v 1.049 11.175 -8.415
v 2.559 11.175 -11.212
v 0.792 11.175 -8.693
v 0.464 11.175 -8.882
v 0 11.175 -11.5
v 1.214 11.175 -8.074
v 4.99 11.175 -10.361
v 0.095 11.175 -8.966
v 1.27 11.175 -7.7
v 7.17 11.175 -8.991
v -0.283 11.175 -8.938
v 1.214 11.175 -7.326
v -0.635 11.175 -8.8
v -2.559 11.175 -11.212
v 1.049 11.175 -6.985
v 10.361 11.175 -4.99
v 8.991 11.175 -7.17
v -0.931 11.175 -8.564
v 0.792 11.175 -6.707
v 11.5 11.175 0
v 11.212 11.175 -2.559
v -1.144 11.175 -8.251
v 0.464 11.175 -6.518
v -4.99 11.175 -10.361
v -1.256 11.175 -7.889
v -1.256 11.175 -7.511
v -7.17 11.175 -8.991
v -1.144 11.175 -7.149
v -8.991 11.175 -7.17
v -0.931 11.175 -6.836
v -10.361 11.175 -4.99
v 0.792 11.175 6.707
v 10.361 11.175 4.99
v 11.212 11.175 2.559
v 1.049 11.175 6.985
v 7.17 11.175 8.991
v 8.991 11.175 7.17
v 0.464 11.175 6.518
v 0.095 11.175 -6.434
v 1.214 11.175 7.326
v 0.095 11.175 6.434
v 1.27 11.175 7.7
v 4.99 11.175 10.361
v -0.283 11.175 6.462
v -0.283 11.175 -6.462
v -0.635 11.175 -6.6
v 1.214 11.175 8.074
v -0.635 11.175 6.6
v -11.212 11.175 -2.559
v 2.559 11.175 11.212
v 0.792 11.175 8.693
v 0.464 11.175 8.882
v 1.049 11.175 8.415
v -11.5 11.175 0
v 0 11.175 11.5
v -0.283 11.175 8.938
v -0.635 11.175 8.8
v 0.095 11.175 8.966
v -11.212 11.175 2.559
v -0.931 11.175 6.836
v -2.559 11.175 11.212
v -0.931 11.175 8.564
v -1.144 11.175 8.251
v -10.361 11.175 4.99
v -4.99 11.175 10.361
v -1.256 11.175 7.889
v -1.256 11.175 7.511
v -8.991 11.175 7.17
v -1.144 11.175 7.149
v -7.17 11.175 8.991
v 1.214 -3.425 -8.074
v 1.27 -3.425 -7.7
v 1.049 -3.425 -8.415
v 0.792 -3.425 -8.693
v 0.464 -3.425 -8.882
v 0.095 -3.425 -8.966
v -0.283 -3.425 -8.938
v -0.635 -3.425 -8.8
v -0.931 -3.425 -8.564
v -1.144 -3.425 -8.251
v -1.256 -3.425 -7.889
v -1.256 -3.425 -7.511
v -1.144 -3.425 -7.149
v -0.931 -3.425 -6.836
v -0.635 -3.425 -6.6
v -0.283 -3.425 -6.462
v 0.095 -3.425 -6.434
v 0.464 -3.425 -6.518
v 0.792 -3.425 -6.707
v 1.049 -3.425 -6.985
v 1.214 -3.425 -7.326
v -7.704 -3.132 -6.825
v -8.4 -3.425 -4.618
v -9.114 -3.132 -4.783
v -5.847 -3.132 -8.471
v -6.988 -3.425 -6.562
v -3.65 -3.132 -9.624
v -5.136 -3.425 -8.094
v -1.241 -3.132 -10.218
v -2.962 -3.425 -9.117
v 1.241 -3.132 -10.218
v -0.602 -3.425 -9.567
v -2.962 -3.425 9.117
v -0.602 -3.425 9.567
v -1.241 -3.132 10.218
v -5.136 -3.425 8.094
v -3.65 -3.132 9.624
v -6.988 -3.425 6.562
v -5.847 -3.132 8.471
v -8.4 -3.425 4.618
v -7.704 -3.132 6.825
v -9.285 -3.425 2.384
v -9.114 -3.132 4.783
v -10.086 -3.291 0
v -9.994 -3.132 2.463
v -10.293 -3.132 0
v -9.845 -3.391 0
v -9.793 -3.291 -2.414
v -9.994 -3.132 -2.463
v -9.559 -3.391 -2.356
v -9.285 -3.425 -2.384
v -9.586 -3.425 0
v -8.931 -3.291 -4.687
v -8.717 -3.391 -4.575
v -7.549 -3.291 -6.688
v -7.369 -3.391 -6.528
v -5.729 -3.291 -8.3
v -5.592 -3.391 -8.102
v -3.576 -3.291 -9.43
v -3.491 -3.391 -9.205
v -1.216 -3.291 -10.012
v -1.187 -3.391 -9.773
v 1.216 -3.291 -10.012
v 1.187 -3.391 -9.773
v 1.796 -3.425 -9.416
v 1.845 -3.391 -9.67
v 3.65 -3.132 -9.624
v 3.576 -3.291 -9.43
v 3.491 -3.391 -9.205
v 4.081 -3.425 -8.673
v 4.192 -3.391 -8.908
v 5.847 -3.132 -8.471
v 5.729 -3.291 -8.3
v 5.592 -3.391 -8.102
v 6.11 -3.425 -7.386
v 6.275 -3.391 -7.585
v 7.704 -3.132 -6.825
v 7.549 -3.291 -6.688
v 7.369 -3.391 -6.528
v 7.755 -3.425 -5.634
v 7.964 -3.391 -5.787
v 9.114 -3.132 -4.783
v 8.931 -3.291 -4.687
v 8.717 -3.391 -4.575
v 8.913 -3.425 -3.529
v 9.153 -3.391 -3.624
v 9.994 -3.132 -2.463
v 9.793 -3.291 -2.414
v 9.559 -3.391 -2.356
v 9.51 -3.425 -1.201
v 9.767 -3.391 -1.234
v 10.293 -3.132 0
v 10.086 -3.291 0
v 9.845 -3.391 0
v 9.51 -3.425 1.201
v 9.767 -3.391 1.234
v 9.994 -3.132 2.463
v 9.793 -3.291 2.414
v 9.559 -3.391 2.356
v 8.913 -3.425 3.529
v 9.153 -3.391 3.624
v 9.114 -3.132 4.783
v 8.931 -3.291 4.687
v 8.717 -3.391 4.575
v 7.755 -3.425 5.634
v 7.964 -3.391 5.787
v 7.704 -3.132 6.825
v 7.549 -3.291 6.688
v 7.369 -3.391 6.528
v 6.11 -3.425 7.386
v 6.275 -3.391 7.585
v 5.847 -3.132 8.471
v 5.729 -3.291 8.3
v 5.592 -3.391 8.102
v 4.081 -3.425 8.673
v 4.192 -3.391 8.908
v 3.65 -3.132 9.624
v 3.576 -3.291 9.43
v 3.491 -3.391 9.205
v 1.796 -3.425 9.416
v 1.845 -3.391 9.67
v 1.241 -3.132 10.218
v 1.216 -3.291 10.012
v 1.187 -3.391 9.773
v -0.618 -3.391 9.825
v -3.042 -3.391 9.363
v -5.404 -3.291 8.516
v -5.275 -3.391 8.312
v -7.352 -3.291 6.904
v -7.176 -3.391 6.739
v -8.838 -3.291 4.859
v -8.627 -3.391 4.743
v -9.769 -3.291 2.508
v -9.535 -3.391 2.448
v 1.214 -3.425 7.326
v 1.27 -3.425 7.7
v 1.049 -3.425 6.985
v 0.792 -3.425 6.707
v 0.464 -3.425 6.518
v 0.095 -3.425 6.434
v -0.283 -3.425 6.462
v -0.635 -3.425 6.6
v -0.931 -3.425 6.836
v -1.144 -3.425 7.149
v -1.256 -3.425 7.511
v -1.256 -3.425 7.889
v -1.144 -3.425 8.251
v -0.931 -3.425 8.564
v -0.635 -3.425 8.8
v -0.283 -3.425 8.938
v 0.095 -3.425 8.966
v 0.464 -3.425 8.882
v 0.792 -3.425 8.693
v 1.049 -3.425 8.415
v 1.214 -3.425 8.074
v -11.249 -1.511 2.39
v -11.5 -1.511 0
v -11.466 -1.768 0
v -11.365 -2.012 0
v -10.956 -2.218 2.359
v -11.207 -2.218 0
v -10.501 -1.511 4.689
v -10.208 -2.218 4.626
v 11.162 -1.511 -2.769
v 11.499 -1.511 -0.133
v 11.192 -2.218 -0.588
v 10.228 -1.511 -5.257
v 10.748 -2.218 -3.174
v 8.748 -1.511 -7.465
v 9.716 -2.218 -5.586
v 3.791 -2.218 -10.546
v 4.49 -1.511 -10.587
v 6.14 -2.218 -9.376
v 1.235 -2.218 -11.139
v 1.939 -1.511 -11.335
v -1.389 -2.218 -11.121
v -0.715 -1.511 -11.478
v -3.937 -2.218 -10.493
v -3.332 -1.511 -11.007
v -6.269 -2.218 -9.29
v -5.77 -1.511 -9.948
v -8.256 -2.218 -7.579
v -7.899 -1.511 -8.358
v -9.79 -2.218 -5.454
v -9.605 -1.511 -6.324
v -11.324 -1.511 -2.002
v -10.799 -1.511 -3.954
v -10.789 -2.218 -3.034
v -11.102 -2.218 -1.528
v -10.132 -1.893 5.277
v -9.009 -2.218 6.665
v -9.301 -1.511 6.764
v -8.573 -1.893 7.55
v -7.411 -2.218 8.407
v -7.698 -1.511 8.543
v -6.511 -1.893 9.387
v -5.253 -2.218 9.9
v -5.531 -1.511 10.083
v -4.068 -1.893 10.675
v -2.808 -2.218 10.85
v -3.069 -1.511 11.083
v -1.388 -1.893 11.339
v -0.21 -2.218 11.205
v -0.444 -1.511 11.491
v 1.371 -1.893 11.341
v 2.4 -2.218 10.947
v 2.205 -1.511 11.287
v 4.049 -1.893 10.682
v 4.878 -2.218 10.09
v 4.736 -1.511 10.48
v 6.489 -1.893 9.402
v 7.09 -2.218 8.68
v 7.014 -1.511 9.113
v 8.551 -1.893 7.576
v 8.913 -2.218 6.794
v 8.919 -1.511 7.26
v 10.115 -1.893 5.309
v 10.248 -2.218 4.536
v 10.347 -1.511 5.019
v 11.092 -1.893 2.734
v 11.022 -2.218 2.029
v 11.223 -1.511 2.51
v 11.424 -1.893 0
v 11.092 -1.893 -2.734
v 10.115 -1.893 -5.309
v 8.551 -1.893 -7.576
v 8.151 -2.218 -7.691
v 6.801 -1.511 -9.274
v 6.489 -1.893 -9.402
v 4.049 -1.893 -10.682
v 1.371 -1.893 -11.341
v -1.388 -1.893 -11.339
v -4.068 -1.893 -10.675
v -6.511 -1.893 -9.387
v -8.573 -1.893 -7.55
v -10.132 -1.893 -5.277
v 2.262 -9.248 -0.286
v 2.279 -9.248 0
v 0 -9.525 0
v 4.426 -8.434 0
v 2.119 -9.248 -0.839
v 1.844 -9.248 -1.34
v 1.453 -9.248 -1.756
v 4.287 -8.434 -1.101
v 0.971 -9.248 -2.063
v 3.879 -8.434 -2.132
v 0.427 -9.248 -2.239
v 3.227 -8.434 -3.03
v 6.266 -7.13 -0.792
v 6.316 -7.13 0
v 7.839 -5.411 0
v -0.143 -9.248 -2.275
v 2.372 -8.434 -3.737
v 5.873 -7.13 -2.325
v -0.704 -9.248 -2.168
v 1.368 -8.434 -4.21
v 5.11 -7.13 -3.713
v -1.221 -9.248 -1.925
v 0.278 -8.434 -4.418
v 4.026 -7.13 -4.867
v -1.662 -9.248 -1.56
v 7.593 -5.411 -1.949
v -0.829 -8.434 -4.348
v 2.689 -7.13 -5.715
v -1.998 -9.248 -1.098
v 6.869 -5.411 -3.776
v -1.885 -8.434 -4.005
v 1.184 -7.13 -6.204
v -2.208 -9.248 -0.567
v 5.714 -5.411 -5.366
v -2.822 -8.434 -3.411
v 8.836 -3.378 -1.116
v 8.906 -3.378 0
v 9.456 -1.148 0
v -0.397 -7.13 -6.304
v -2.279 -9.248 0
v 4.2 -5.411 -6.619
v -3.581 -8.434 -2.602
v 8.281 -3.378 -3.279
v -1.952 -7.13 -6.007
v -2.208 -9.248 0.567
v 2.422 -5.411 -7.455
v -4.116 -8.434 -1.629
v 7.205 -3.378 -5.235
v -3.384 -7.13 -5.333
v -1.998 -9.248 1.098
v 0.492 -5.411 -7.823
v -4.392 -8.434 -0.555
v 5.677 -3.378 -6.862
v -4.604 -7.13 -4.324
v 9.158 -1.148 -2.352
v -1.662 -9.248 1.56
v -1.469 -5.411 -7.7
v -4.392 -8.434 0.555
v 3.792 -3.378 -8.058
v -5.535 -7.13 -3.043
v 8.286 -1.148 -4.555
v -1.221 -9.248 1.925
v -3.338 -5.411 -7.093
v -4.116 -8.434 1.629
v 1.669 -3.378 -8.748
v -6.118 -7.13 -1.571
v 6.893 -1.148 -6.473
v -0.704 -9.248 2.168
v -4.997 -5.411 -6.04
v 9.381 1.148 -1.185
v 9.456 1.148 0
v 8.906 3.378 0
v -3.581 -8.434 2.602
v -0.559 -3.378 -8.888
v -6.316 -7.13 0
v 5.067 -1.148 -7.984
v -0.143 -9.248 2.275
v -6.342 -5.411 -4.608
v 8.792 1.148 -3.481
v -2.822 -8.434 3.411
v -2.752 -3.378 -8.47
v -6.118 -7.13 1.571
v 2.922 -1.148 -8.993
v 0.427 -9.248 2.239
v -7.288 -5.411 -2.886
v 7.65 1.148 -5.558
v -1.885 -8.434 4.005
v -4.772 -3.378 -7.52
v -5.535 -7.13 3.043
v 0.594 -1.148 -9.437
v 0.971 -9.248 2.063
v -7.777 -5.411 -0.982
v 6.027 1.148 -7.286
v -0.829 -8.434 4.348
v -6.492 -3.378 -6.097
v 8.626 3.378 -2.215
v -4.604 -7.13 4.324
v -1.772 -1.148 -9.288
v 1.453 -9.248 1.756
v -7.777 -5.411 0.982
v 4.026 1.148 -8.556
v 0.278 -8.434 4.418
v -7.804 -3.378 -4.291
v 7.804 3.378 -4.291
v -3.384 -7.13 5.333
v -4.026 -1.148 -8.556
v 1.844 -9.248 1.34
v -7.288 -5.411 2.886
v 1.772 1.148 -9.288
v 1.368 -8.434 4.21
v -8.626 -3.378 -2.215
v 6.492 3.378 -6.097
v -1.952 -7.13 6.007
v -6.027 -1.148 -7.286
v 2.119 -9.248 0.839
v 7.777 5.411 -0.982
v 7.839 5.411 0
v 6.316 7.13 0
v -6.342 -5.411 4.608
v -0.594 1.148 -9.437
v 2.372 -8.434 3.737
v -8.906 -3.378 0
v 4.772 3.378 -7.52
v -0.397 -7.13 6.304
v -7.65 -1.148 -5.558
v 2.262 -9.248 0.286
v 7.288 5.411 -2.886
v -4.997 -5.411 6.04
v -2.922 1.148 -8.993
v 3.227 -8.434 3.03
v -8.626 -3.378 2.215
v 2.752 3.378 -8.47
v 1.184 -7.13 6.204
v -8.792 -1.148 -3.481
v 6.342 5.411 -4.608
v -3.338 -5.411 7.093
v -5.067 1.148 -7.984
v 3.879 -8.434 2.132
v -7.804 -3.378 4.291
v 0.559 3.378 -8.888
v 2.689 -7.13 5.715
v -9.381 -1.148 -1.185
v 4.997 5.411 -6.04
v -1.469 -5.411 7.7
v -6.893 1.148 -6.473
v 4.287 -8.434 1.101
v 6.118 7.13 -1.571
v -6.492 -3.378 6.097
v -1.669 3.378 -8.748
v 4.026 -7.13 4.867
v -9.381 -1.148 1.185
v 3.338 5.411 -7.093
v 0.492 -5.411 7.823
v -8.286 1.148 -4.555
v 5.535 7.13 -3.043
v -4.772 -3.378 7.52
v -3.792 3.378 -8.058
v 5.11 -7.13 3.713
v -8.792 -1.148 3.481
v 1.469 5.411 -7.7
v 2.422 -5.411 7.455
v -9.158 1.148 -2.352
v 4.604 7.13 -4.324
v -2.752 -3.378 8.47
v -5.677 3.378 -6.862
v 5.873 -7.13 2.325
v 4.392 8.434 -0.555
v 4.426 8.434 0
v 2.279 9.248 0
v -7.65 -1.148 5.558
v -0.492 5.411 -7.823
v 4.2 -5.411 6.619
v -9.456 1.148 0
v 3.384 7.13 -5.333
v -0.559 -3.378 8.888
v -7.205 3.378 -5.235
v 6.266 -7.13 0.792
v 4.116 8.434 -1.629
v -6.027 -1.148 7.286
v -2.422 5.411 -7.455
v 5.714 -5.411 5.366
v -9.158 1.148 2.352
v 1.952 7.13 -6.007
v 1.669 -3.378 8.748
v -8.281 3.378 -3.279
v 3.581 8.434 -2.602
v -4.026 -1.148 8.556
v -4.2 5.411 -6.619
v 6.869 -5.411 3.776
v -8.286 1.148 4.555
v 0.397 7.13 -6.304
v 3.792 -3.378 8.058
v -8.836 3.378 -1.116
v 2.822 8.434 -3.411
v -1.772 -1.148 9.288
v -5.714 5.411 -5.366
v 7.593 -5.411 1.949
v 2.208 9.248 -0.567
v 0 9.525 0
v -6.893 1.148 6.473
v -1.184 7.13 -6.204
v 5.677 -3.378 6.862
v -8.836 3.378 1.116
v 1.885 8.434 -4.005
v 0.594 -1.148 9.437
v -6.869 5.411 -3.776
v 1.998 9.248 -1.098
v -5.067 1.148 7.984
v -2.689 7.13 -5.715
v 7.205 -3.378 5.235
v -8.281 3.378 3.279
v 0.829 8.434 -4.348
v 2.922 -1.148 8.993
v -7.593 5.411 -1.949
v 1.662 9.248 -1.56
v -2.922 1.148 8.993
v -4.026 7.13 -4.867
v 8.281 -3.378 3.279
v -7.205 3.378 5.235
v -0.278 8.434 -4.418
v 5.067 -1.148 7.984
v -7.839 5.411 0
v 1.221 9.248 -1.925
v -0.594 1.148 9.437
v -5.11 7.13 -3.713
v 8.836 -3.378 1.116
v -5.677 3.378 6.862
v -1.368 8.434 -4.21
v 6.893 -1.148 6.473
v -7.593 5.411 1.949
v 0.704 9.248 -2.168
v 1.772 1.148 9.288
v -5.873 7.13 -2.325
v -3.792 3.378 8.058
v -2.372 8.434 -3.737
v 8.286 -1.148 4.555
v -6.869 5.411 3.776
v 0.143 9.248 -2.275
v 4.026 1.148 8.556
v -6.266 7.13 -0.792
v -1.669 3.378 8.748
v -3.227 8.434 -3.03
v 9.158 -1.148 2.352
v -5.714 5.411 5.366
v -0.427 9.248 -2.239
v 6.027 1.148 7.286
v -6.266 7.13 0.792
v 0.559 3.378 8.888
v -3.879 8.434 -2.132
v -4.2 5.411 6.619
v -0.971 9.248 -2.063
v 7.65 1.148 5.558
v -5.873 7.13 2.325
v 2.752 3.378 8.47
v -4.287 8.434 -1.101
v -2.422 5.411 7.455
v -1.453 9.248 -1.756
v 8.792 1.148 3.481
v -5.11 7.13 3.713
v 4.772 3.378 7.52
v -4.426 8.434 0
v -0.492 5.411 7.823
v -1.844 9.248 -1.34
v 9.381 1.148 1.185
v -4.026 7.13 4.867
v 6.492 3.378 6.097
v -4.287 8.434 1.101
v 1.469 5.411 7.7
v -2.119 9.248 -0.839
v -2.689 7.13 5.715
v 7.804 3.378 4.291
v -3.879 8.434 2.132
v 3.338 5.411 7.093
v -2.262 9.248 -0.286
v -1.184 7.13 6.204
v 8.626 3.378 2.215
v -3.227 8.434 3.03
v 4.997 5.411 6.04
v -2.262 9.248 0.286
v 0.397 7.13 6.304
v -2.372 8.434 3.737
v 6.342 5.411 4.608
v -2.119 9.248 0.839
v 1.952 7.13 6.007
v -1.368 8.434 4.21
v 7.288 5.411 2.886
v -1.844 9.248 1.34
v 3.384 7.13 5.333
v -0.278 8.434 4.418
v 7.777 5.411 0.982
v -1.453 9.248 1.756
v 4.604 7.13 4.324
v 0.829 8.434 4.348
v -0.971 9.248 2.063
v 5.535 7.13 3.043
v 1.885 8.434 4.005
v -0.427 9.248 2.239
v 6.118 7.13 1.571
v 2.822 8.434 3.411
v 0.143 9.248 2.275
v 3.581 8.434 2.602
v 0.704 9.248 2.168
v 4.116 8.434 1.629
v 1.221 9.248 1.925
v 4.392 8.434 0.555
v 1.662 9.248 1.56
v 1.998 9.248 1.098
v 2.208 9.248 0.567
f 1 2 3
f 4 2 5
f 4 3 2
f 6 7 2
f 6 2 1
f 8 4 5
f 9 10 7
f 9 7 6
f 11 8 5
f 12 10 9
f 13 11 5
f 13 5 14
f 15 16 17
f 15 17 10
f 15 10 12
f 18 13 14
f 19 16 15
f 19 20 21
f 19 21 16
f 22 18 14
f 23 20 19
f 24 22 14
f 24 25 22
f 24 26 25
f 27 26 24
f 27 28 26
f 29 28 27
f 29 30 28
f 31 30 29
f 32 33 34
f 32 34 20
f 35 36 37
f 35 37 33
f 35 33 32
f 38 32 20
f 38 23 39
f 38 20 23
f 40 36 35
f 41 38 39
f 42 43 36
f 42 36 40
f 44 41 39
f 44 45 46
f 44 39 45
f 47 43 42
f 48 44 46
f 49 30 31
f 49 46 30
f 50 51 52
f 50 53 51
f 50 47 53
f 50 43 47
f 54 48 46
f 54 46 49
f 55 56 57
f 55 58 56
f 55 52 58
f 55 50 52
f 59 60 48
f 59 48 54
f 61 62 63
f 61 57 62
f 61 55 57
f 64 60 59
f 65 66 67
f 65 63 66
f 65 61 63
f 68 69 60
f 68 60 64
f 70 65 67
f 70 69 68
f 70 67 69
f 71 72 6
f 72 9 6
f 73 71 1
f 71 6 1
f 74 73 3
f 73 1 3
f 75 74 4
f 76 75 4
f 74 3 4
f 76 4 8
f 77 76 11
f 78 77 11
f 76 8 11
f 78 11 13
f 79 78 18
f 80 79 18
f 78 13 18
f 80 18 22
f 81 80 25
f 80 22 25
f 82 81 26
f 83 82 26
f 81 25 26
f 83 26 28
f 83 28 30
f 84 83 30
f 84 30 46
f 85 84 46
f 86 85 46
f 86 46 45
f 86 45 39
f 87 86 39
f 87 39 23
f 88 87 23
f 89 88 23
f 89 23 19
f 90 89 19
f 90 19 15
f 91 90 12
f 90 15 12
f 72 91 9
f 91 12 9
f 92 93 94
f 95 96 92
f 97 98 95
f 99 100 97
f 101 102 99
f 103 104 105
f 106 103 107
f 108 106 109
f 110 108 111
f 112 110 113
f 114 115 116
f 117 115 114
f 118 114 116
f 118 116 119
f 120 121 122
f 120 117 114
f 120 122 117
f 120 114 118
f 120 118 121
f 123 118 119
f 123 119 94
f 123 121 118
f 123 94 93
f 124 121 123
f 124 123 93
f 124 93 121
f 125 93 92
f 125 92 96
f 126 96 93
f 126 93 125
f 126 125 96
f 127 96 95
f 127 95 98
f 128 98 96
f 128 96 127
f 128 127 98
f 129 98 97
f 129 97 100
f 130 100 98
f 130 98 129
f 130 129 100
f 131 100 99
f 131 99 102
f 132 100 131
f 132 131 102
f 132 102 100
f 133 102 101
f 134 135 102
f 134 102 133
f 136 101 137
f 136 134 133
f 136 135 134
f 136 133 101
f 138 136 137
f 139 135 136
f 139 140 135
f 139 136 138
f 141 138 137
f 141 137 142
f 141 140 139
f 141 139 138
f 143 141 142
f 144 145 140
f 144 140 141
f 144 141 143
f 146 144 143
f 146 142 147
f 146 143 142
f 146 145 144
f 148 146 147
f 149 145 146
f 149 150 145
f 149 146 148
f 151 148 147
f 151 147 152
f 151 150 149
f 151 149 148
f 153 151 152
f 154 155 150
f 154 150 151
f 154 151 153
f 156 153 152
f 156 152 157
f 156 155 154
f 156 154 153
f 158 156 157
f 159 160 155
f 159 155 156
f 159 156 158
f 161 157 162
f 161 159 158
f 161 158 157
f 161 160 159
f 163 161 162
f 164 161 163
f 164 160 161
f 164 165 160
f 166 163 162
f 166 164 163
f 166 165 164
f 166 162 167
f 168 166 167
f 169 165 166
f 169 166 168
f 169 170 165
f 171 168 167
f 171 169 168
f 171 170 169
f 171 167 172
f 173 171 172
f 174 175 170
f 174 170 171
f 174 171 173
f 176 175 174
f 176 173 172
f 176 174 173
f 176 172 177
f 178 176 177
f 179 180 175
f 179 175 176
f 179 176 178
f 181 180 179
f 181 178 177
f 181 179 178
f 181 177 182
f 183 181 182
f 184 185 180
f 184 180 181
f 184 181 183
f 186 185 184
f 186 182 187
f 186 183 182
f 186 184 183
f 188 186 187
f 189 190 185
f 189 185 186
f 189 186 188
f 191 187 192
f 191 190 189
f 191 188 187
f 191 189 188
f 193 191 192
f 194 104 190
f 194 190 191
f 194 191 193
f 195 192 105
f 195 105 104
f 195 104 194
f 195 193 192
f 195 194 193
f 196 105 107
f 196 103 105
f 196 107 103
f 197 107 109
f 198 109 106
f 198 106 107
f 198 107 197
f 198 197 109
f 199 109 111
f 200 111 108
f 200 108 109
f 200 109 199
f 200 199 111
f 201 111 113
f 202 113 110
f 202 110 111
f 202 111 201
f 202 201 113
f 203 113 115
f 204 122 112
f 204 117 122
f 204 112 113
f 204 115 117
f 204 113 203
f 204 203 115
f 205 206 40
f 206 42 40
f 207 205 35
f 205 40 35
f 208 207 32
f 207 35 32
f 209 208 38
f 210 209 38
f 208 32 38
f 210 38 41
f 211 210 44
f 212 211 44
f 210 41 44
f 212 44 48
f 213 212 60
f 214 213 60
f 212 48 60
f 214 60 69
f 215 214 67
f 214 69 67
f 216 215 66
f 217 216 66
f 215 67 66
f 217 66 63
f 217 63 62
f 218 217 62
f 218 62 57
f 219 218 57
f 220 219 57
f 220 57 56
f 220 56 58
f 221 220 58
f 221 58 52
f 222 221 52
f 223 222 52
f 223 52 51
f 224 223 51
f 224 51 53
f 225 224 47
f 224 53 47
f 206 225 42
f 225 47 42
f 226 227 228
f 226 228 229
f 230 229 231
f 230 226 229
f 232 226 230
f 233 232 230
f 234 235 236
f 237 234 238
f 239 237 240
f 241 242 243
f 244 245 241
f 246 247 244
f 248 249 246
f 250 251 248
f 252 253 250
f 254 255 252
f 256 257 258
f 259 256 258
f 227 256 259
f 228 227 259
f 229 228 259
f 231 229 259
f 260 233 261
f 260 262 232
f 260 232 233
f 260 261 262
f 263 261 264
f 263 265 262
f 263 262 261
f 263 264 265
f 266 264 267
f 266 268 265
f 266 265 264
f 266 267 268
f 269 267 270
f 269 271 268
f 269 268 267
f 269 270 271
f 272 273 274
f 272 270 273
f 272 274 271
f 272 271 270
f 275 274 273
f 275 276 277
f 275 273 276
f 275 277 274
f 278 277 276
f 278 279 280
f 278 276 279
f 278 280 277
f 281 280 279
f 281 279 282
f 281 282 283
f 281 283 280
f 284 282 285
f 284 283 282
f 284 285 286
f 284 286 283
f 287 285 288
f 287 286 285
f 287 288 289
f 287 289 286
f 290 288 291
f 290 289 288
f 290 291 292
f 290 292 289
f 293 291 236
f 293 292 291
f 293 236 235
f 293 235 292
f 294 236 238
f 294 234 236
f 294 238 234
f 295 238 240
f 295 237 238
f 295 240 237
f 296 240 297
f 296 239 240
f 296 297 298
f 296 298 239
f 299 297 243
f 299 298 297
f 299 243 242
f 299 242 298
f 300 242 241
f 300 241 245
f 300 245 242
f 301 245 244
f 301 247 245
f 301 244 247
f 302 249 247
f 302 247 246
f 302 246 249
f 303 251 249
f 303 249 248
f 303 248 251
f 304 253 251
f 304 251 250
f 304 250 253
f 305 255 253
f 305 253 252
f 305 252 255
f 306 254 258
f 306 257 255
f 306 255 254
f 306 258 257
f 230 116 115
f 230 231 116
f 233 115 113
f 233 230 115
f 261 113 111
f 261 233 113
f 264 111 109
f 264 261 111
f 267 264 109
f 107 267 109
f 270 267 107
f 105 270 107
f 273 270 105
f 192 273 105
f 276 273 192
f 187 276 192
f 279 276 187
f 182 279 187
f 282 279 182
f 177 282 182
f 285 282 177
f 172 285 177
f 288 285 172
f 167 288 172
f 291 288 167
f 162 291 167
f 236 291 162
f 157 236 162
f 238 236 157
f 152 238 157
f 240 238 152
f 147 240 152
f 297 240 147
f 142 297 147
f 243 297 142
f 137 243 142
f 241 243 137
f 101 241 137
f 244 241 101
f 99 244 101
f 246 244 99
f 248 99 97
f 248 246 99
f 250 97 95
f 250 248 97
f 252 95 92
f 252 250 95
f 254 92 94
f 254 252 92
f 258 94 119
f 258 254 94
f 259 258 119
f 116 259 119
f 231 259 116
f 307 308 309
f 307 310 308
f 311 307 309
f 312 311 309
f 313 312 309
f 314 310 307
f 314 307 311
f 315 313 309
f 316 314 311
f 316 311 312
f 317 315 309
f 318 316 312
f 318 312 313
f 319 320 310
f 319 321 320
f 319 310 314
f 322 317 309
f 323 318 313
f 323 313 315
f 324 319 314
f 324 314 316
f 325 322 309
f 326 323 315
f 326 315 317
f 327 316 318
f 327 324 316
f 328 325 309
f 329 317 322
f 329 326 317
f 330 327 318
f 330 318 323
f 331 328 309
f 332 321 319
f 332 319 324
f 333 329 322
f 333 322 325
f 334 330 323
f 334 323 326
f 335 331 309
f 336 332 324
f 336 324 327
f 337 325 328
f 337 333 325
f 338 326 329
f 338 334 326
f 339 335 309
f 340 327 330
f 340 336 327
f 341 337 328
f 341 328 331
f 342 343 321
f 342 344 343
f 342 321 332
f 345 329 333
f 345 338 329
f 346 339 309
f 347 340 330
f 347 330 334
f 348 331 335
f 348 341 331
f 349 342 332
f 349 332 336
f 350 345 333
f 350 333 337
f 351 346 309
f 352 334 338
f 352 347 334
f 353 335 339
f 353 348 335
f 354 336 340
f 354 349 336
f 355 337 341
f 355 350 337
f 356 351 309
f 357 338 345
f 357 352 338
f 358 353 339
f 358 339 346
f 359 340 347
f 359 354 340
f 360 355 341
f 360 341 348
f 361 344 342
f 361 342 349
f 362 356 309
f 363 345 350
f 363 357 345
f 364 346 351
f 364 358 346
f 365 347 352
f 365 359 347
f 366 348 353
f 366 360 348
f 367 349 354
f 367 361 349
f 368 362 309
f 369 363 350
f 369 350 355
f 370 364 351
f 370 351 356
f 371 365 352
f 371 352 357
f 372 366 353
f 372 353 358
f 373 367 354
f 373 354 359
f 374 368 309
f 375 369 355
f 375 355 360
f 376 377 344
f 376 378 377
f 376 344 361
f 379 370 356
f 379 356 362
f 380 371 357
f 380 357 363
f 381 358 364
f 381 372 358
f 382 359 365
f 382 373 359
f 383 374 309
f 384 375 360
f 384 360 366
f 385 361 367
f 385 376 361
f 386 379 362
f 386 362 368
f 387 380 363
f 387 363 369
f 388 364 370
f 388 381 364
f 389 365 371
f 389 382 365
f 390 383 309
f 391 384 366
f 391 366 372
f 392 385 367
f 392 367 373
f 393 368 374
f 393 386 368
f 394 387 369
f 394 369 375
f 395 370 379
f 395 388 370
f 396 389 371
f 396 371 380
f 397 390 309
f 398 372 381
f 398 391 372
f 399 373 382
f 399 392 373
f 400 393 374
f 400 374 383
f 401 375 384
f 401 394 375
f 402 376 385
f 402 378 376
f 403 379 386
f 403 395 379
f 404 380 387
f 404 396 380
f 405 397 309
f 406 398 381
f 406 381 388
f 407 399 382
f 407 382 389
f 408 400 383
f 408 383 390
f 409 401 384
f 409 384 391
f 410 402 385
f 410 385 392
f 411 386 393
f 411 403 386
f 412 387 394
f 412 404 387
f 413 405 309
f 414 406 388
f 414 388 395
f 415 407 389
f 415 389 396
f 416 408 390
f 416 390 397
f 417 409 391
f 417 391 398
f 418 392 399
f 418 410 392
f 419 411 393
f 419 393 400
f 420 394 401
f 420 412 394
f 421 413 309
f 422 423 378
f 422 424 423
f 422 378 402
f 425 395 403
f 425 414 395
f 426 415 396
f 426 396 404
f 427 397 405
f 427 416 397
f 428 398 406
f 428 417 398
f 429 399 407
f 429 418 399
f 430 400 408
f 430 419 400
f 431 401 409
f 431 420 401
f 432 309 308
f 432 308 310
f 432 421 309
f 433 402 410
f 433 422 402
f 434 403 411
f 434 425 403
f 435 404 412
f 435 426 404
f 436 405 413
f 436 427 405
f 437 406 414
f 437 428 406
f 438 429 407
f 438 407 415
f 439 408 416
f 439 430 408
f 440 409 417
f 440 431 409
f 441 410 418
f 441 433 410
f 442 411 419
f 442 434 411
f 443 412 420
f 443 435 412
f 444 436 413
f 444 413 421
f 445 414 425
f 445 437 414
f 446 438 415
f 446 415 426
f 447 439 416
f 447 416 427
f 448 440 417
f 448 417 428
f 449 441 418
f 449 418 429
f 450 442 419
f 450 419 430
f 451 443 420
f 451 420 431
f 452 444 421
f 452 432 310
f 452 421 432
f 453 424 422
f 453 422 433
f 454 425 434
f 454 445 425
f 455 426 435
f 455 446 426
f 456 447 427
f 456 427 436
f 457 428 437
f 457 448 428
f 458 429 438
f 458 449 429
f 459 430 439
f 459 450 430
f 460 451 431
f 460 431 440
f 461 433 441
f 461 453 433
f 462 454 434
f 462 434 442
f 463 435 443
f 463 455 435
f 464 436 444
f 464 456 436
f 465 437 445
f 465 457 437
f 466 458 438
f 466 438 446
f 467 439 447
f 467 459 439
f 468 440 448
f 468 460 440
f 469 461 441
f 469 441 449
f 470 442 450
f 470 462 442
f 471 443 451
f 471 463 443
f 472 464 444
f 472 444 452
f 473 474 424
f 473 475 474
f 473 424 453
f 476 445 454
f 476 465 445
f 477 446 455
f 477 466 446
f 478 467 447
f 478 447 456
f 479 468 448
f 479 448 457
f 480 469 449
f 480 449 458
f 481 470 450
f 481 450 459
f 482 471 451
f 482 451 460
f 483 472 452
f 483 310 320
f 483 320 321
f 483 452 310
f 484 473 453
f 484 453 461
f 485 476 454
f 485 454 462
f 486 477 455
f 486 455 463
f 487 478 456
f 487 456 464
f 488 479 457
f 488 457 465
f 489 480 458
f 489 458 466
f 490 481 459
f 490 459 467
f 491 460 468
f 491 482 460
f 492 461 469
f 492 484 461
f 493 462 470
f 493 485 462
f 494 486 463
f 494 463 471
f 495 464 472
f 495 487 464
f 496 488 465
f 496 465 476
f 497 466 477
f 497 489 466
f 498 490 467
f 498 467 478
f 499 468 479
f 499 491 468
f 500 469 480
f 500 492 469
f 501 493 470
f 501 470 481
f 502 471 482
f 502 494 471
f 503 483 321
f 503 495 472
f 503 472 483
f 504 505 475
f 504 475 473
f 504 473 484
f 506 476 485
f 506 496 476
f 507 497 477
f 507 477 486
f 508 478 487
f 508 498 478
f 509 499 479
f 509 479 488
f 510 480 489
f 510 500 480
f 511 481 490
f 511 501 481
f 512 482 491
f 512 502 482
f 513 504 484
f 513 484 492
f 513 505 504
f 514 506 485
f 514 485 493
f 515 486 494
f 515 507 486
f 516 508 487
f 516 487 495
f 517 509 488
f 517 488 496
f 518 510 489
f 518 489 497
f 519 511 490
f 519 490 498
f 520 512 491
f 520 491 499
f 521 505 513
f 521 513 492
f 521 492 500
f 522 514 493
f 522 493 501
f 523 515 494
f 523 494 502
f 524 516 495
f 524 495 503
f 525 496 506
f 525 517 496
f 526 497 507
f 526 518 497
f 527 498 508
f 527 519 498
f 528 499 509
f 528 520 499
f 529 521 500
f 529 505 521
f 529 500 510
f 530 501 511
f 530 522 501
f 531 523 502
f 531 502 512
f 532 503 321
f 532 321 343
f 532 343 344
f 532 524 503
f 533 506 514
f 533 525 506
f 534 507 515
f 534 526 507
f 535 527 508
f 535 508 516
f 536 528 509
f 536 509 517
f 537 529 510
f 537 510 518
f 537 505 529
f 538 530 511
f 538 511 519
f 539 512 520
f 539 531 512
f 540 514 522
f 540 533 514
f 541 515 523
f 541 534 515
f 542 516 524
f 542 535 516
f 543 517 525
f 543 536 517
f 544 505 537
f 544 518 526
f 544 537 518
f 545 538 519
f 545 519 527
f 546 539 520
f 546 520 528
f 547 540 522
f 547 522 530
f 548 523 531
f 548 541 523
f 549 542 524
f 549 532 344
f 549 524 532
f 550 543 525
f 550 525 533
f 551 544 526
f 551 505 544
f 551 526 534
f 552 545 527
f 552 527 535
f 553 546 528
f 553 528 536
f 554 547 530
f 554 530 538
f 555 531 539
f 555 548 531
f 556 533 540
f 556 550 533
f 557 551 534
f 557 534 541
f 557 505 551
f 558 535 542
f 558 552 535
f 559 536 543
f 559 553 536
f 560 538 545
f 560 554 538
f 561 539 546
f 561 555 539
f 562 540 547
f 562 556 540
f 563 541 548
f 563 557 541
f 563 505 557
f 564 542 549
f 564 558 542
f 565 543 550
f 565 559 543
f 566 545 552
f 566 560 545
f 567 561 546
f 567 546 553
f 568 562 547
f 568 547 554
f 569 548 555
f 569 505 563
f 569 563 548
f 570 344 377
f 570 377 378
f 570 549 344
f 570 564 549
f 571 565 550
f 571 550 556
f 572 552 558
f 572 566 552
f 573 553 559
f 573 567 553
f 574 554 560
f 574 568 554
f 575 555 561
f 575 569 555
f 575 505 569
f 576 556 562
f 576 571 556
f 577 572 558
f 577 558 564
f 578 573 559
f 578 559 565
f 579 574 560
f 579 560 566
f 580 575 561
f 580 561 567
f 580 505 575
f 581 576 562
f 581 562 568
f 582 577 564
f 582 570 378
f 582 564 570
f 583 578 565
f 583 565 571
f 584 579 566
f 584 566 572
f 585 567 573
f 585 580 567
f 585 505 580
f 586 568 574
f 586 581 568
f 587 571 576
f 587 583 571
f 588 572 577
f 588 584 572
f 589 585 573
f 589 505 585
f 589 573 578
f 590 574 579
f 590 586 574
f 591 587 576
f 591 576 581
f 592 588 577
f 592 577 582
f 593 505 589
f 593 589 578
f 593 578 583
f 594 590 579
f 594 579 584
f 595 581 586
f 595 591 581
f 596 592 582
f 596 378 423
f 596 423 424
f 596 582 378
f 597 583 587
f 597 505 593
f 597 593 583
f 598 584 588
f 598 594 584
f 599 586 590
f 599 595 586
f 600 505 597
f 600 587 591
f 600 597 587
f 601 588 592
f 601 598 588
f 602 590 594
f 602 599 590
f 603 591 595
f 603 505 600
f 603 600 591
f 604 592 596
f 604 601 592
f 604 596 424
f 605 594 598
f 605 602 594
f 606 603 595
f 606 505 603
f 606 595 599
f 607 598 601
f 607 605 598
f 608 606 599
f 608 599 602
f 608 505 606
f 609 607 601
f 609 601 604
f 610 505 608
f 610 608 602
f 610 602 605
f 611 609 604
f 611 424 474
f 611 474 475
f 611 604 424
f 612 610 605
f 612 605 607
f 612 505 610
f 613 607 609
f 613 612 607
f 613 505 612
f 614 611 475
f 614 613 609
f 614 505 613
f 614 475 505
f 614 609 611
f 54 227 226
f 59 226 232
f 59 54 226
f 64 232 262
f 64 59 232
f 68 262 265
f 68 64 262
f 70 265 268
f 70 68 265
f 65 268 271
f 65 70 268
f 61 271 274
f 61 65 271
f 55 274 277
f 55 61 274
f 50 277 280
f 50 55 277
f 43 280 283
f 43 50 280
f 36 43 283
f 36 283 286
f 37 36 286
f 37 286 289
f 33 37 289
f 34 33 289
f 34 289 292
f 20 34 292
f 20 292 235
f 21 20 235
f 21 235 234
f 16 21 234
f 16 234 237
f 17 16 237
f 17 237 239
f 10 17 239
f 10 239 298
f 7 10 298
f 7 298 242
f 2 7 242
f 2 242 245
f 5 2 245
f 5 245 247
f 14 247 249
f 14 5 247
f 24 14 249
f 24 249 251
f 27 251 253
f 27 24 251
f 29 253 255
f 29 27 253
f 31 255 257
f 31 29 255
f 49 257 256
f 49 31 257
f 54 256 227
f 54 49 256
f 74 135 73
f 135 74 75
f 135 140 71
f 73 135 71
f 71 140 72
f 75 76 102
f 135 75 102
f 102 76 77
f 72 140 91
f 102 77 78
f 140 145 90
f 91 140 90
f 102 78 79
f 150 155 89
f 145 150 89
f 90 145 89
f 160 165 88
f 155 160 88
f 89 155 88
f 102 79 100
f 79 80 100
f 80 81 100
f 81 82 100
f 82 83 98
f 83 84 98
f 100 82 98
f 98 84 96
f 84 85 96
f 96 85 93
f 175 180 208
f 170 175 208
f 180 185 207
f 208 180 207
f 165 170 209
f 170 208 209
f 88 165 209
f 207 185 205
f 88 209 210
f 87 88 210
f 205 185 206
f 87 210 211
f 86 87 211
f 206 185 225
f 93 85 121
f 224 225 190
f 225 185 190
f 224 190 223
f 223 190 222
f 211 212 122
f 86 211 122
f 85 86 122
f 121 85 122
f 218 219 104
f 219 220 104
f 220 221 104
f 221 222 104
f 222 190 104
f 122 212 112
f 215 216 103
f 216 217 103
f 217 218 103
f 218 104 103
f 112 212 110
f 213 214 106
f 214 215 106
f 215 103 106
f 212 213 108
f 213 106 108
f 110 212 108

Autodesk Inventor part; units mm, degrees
ref_plane "YZ Plane" through (0, 0, 0) normal (1, 0, 0) x (0, 1, 0)
ref_plane "XY Plane" through (0, 0, 0) normal (0, 0, 1) x (1, 0, 0)
sketch "Sketch1" plane through (0, 0, 0) normal (0, 0, 1) x (1, 0, 0)
  line L0 (0, 9.525) -> (0, -9.525)
  arc A0 (0, -9.525) -> (0, 9.525) centre (0, 0) ccw
  dimension "d0" = 19.05
revolve "Revolution1" add sketch "Sketch1" angle 360 about axis through (0, 9.525, 0) along (0, -1, 0)
ref_plane "Work Plane1" through (0, 9.525, 0) normal (0, 1, 0) x (-1, 0, 0)
ref_plane "Work Plane3" through (0, 11.175, 0) normal (0, 1, 0) x (-1, 0, 0)
ref_plane "Work Plane2" through (0, -9.525, 0) normal (0, 1, 0) x (-1, 0, 0)
sketch "Sketch2" plane through (0, 11.175, 0) normal (0, 1, 0) x (-1, 0, 0)
  circle A0 centre (0, 0) radius 11.5
  dimension "d2" = 23
extrude "Extrusion1" add sketch "Sketch2" against normal blind 14.6 separate body
chamfer "Chamfer1" distance 1.5 angle 45 1 edges at (11.5, -3.425, 0)
fillet "Fillet1" radius 1 2 edges at (10, -3.425, 0) (11.5, -1.925, 0)
sketch "Sketch3" plane through (0, 11.175, 0) normal (0, 1, 0) x (1, 0, 0)
  line L0 (0, -7.7) -> (0, 7.7) construction
  circle A0 centre (0, -7.7) radius 1.27
  circle A1 centre (0, 7.7) radius 1.27
  point P0 (0, 0)
  point P1 (0, 0)
  dimension "d11" = 15.4
  dimension "d12" = 2.54
  dimension "d13" = 2.54
extrude "Extrusion2" cut sketch "Sketch3" against normal blind 14.6 bodies 2
properties part number "0.75in Ball Caster (Pololu)" material "Stainless Steel"
